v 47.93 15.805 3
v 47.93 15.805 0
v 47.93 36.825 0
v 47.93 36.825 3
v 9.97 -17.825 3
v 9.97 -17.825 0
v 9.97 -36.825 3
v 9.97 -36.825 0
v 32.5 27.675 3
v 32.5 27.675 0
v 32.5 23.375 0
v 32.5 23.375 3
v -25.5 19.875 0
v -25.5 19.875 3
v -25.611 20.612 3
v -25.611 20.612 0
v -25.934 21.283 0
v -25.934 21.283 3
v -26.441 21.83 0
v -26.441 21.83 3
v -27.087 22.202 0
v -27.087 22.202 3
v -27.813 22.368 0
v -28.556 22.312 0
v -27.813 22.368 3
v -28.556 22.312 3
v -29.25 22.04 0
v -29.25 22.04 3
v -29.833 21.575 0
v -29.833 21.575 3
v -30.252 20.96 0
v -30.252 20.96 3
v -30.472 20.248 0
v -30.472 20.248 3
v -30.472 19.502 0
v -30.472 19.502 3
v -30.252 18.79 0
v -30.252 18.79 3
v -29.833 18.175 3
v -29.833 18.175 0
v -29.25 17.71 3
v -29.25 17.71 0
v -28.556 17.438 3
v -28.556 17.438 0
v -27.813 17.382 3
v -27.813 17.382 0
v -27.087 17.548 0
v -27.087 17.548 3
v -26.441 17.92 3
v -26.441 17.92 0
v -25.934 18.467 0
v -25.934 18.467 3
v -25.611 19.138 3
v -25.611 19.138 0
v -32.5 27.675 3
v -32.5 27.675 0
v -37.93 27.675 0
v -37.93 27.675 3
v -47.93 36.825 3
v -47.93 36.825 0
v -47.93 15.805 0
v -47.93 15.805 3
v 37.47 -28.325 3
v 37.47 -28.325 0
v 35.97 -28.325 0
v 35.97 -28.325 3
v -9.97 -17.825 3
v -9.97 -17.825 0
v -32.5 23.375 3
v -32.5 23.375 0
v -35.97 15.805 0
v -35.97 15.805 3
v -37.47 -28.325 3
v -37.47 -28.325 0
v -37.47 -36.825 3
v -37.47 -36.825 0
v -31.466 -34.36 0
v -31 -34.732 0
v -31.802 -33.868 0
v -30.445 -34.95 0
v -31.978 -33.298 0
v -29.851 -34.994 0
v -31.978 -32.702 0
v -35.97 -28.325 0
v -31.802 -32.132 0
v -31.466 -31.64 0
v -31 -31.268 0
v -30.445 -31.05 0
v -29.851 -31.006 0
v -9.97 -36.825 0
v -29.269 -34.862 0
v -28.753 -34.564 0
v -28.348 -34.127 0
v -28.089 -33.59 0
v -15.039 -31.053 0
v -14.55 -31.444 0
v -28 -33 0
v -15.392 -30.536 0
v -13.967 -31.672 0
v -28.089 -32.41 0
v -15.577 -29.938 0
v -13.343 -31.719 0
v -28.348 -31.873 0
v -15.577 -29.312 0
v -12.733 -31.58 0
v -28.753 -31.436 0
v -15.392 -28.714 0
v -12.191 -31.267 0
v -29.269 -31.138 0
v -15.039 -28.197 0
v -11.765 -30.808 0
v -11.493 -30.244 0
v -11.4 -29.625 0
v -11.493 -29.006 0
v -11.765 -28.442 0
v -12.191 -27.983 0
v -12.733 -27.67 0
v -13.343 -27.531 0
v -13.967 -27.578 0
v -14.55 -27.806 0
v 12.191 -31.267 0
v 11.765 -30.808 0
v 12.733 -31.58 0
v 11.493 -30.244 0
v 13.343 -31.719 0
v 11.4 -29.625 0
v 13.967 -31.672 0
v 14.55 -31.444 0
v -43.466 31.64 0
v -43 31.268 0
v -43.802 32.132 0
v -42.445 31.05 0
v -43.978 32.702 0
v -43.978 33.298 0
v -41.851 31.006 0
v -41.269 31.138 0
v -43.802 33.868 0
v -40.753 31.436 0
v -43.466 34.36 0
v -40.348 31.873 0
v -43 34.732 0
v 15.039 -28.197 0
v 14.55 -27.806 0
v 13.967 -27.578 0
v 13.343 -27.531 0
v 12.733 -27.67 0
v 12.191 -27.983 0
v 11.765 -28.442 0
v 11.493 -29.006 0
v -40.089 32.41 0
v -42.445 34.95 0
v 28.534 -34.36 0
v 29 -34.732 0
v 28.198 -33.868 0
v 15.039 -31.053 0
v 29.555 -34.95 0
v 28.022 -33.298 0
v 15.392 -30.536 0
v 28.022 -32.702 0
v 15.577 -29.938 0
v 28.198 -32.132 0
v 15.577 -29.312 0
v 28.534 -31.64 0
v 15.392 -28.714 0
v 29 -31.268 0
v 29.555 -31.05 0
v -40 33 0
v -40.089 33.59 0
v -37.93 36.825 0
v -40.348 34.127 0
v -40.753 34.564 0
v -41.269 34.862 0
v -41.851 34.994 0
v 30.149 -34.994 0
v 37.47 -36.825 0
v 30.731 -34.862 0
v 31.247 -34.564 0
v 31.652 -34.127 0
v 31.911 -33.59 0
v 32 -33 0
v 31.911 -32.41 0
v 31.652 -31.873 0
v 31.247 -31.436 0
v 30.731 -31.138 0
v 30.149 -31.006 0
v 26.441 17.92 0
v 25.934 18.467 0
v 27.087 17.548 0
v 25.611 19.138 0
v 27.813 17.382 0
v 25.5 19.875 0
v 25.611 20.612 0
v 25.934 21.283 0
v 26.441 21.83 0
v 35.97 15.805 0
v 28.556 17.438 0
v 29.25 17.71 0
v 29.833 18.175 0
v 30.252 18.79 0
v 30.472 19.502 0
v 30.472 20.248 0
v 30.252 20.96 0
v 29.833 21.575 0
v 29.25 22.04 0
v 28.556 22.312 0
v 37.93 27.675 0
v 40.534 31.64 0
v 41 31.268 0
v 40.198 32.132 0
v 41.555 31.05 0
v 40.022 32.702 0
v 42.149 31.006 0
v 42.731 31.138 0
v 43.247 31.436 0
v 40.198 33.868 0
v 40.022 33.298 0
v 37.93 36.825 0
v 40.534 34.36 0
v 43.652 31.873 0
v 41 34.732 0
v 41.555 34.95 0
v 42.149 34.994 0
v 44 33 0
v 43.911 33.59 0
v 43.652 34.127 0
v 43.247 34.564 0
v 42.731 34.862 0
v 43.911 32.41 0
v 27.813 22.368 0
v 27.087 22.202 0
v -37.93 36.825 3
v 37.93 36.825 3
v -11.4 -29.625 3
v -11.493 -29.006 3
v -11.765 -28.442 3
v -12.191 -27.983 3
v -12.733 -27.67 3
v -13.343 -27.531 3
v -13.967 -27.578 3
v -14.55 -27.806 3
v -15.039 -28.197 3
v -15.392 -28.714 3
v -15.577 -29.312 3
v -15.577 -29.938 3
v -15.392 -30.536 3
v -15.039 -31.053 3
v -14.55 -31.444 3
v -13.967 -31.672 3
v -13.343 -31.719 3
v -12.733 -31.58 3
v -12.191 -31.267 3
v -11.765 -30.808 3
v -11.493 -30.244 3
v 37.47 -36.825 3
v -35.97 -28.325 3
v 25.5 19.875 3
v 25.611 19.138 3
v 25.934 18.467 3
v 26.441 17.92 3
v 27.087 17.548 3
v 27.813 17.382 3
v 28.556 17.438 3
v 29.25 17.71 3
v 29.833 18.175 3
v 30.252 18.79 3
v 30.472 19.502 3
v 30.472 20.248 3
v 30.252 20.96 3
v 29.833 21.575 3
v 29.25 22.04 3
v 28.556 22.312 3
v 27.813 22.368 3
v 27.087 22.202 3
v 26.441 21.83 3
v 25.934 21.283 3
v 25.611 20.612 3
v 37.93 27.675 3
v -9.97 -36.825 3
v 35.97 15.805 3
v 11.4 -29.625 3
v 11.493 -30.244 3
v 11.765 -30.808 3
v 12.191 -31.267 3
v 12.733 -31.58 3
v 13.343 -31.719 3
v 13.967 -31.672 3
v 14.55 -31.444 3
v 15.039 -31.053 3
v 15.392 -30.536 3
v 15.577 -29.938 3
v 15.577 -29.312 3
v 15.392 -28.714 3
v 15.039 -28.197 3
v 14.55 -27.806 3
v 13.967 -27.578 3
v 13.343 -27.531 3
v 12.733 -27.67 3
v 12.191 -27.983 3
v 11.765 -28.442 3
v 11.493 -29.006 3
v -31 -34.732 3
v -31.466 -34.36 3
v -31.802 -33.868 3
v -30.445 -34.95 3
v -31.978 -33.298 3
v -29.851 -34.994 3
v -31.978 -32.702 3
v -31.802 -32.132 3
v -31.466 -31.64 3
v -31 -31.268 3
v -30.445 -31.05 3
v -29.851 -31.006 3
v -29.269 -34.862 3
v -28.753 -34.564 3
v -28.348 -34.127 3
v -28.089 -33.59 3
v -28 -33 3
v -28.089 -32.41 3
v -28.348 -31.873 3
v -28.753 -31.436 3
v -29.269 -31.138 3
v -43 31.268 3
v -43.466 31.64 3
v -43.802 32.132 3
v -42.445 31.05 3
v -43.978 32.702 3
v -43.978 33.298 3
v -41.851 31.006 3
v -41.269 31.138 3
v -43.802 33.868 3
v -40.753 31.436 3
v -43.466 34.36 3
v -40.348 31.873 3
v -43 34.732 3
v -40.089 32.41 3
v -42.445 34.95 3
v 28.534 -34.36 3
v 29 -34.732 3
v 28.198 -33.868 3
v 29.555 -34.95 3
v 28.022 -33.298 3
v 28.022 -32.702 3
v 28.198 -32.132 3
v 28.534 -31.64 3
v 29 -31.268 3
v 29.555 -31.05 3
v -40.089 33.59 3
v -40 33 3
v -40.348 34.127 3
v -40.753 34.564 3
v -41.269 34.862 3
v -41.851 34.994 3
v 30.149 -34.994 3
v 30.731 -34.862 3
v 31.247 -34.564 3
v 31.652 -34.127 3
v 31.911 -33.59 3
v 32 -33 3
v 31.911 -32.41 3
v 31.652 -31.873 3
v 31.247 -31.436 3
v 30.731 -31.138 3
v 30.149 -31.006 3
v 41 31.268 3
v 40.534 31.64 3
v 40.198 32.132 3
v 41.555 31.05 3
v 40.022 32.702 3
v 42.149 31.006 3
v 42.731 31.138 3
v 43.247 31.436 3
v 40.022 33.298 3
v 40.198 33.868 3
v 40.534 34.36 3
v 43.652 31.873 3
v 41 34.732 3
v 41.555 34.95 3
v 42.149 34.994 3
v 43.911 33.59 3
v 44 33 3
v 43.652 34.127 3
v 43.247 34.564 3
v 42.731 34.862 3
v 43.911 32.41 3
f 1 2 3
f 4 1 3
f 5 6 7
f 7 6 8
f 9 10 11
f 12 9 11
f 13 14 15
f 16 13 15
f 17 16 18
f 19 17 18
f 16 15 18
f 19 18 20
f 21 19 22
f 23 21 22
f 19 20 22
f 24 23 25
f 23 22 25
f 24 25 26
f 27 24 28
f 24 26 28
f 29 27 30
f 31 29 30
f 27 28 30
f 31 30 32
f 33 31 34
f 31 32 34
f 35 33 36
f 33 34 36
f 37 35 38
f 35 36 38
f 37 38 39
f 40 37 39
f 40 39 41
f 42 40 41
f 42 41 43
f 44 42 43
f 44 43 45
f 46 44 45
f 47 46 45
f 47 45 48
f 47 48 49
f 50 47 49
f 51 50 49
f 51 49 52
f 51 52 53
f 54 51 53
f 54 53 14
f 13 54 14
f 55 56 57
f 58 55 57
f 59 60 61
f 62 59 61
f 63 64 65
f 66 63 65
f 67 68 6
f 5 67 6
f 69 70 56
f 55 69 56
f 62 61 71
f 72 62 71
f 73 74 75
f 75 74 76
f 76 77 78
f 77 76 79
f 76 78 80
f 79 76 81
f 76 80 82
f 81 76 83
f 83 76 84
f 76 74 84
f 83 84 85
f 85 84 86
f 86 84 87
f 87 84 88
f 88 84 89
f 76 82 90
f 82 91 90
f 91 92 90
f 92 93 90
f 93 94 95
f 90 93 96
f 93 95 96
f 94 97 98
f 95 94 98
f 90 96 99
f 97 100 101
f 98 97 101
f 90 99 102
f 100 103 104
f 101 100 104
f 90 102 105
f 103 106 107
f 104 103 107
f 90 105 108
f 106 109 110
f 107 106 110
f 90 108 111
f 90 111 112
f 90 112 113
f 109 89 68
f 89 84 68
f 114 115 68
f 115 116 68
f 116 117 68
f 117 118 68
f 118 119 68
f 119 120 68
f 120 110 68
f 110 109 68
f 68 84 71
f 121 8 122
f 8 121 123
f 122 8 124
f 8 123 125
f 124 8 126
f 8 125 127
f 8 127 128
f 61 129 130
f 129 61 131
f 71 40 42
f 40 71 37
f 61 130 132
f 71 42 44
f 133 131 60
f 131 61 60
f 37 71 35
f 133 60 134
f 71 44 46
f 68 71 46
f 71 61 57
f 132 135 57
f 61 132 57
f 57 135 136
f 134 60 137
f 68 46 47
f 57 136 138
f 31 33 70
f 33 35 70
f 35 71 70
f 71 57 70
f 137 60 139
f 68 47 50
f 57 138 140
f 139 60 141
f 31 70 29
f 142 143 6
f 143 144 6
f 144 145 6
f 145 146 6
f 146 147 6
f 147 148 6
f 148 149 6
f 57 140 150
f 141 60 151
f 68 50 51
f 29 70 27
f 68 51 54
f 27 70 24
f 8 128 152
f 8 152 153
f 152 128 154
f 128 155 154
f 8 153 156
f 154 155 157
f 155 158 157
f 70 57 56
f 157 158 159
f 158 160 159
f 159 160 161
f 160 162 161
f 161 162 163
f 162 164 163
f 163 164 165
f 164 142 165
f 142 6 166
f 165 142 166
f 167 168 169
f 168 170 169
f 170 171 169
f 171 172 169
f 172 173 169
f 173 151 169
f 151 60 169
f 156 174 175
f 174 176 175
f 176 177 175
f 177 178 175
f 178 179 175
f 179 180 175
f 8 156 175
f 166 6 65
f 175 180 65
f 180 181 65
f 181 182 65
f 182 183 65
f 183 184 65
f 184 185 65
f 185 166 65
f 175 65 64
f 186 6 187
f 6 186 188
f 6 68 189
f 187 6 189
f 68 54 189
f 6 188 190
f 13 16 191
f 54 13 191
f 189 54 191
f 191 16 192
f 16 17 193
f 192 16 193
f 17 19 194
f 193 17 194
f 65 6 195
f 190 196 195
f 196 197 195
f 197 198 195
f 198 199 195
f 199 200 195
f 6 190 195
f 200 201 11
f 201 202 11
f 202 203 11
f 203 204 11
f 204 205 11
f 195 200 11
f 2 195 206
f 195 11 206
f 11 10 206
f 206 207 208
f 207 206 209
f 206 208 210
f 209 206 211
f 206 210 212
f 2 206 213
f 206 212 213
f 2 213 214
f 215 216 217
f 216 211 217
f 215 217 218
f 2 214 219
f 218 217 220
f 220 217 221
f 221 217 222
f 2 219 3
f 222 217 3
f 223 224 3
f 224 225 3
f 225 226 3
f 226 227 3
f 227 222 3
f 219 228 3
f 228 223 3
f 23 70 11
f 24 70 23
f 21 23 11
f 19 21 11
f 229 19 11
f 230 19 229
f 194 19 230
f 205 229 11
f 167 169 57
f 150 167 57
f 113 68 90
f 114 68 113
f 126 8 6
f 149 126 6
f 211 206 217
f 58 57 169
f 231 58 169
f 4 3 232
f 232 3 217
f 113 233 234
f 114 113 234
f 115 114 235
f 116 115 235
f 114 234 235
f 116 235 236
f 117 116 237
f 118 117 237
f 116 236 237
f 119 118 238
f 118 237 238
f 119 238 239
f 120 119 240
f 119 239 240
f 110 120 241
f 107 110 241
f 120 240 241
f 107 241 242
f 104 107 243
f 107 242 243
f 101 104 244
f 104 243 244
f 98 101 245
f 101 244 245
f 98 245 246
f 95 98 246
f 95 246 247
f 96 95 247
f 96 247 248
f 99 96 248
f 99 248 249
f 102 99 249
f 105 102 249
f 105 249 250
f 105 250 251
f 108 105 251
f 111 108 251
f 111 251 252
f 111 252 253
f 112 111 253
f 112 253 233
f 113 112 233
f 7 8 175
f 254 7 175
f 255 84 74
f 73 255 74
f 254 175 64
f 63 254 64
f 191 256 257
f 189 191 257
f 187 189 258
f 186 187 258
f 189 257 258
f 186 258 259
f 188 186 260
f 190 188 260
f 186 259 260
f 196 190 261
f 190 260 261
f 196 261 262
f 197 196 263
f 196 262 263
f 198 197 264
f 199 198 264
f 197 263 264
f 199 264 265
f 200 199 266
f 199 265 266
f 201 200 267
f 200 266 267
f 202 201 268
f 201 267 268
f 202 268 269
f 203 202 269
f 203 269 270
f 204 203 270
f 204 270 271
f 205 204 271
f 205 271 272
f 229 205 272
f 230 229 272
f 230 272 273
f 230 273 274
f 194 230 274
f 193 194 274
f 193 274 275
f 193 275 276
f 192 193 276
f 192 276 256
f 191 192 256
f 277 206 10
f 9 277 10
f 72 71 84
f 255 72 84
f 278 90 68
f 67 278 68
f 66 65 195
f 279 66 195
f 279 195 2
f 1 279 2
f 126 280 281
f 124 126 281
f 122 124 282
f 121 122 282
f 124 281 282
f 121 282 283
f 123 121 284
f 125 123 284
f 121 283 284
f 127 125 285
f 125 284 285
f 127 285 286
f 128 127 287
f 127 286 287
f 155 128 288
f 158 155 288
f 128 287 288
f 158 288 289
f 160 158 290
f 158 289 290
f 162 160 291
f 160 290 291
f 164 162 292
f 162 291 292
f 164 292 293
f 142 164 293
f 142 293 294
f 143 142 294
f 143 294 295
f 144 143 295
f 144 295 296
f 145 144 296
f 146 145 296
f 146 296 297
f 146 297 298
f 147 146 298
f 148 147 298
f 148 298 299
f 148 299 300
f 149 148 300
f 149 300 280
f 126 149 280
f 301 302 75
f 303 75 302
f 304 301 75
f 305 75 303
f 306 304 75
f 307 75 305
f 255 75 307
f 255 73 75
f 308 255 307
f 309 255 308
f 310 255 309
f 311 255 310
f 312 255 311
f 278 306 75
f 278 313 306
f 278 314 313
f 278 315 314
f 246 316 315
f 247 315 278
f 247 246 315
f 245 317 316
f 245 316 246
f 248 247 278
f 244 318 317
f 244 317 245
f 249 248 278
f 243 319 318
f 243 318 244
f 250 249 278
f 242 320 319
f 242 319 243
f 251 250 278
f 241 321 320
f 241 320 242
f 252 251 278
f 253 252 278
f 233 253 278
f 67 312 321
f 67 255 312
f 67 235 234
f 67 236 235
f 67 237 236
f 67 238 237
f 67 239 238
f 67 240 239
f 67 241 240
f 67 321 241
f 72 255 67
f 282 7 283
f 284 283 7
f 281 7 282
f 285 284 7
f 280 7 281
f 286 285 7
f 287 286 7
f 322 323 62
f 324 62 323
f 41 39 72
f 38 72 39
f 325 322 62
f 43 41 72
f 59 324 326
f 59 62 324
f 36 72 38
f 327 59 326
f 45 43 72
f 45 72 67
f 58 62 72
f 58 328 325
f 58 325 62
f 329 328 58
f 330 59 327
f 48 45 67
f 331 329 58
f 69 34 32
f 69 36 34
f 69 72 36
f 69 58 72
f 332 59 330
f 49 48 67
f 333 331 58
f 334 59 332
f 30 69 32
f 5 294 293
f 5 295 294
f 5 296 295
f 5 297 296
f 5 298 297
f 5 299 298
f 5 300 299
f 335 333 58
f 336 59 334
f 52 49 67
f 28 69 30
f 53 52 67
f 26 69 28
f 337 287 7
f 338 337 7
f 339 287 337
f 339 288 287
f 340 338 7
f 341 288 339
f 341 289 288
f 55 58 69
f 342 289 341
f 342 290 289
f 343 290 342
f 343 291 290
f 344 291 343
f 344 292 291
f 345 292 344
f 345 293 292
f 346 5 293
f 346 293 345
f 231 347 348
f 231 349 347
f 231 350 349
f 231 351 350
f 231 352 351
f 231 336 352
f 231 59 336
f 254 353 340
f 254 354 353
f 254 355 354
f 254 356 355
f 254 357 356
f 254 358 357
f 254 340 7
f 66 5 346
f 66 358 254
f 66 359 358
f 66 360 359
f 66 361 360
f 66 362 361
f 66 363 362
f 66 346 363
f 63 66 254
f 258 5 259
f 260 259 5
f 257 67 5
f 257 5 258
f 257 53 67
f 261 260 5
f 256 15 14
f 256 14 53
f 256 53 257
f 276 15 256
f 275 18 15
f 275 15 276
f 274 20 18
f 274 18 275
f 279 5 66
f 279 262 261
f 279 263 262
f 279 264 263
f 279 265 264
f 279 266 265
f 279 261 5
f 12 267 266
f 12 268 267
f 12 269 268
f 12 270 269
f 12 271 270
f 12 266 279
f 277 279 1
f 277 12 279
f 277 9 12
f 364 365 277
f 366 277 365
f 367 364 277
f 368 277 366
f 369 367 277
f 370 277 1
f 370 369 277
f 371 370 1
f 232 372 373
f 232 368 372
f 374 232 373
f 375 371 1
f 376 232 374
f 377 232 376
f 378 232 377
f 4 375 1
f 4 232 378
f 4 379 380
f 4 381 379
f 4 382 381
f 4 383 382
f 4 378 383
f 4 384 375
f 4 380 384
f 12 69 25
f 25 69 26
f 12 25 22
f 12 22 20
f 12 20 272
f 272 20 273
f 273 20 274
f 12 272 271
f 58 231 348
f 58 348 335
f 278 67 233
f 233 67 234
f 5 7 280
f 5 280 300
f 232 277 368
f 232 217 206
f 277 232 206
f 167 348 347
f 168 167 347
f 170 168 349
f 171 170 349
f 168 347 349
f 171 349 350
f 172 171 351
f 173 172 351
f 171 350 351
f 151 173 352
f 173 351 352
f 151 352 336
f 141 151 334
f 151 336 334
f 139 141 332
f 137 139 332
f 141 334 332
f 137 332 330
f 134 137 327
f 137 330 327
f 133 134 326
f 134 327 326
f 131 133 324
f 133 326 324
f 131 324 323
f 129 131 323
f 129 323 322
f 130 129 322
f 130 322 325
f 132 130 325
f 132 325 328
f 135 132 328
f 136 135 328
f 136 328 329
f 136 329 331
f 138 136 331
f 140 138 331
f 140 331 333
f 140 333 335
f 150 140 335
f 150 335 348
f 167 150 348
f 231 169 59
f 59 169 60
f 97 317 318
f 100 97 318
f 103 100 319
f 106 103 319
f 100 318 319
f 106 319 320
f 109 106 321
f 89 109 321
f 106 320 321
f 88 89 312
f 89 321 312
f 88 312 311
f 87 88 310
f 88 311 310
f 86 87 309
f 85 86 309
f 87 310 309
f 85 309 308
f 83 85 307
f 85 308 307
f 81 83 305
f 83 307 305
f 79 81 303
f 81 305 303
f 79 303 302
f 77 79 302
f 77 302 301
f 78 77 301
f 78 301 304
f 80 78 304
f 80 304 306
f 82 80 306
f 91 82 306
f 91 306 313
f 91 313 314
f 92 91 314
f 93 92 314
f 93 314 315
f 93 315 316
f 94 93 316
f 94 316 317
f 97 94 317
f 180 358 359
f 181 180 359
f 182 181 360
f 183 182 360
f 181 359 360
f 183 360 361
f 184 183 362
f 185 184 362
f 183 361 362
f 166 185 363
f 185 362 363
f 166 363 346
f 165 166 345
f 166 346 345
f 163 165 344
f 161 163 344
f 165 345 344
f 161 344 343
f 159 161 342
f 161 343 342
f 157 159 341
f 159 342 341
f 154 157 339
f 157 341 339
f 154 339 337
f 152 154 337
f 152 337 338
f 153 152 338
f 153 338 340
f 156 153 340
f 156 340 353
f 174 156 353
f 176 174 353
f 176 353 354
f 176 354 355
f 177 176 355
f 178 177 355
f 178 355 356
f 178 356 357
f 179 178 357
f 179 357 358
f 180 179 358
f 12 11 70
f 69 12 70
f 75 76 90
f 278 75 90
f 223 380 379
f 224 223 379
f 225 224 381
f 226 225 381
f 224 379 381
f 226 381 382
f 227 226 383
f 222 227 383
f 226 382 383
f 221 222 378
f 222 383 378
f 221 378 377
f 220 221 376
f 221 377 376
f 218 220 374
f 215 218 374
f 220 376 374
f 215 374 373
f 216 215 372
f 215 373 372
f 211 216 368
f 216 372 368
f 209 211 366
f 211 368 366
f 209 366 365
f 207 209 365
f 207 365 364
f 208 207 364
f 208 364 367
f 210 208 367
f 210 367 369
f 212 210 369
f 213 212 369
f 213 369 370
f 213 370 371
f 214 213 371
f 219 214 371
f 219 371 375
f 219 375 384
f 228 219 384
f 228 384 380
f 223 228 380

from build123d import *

# Parameters (mm, degrees)
EXTRUDE_1_DEPTH     = 3
SKETCH_3_R          = 2.5
SKETCH_3_R_2        = 2.1
CUT_EXTRUDE_1_DEPTH = 61.517481152
SKETCH_4_R          = 2
CUT_EXTRUDE_2_DEPTH = 10


with BuildPart() as part:
    # 草图2 → 凸台-拉伸1 (new body)
    with BuildSketch(Plane.XY):
        Polygon((32.5, 23.375), (-32.5, 23.375), (-32.5, 27.675), (-37.93, 27.675), (-37.93, 36.825), (-47.93, 36.825), (-47.93, 15.805), (-35.97, 15.805), (-35.97, -28.325), (-37.47, -28.325), (-37.47, -36.825), (-9.97, -36.825), (-9.97, -17.825), (9.97, -17.825), (9.97, -36.825), (37.47, -36.825), (37.47, -28.325), (35.97, -28.325), (35.97, 15.805), (47.93, 15.805), (47.93, 36.825), (37.93, 36.825), (37.93, 27.675), (32.5, 27.675), align=None)
    extrude(amount=EXTRUDE_1_DEPTH)

    # 草图3 → 切除-拉伸1 (cut, through all)
    with BuildSketch(Plane.XY.offset(3)):
        with Locations((-28, 19.875)):
            Circle(SKETCH_3_R)
        with Locations((-13.5, -29.625)):
            Circle(SKETCH_3_R_2)
        with Locations(Location((13.5, -29.625, 0), (0, 0, 180))):
            Circle(SKETCH_3_R_2)
        with Locations(Location((28, 19.875, 0), (0, 0, 180))):
            Circle(SKETCH_3_R)
    extrude(amount=-CUT_EXTRUDE_1_DEPTH, mode=Mode.SUBTRACT)

    # 草图4 → 切除-拉伸2 (cut)
    with BuildSketch(Plane.XY.offset(3)):
        with Locations((-42, 33)):
            Circle(SKETCH_4_R)
        with Locations((-30, -33)):
            Circle(SKETCH_4_R)
        with Locations((30, -33)):
            Circle(SKETCH_4_R)
        with Locations((42, 33)):
            Circle(SKETCH_4_R)
    extrude(amount=-CUT_EXTRUDE_2_DEPTH, mode=Mode.SUBTRACT)


solid = part.part
